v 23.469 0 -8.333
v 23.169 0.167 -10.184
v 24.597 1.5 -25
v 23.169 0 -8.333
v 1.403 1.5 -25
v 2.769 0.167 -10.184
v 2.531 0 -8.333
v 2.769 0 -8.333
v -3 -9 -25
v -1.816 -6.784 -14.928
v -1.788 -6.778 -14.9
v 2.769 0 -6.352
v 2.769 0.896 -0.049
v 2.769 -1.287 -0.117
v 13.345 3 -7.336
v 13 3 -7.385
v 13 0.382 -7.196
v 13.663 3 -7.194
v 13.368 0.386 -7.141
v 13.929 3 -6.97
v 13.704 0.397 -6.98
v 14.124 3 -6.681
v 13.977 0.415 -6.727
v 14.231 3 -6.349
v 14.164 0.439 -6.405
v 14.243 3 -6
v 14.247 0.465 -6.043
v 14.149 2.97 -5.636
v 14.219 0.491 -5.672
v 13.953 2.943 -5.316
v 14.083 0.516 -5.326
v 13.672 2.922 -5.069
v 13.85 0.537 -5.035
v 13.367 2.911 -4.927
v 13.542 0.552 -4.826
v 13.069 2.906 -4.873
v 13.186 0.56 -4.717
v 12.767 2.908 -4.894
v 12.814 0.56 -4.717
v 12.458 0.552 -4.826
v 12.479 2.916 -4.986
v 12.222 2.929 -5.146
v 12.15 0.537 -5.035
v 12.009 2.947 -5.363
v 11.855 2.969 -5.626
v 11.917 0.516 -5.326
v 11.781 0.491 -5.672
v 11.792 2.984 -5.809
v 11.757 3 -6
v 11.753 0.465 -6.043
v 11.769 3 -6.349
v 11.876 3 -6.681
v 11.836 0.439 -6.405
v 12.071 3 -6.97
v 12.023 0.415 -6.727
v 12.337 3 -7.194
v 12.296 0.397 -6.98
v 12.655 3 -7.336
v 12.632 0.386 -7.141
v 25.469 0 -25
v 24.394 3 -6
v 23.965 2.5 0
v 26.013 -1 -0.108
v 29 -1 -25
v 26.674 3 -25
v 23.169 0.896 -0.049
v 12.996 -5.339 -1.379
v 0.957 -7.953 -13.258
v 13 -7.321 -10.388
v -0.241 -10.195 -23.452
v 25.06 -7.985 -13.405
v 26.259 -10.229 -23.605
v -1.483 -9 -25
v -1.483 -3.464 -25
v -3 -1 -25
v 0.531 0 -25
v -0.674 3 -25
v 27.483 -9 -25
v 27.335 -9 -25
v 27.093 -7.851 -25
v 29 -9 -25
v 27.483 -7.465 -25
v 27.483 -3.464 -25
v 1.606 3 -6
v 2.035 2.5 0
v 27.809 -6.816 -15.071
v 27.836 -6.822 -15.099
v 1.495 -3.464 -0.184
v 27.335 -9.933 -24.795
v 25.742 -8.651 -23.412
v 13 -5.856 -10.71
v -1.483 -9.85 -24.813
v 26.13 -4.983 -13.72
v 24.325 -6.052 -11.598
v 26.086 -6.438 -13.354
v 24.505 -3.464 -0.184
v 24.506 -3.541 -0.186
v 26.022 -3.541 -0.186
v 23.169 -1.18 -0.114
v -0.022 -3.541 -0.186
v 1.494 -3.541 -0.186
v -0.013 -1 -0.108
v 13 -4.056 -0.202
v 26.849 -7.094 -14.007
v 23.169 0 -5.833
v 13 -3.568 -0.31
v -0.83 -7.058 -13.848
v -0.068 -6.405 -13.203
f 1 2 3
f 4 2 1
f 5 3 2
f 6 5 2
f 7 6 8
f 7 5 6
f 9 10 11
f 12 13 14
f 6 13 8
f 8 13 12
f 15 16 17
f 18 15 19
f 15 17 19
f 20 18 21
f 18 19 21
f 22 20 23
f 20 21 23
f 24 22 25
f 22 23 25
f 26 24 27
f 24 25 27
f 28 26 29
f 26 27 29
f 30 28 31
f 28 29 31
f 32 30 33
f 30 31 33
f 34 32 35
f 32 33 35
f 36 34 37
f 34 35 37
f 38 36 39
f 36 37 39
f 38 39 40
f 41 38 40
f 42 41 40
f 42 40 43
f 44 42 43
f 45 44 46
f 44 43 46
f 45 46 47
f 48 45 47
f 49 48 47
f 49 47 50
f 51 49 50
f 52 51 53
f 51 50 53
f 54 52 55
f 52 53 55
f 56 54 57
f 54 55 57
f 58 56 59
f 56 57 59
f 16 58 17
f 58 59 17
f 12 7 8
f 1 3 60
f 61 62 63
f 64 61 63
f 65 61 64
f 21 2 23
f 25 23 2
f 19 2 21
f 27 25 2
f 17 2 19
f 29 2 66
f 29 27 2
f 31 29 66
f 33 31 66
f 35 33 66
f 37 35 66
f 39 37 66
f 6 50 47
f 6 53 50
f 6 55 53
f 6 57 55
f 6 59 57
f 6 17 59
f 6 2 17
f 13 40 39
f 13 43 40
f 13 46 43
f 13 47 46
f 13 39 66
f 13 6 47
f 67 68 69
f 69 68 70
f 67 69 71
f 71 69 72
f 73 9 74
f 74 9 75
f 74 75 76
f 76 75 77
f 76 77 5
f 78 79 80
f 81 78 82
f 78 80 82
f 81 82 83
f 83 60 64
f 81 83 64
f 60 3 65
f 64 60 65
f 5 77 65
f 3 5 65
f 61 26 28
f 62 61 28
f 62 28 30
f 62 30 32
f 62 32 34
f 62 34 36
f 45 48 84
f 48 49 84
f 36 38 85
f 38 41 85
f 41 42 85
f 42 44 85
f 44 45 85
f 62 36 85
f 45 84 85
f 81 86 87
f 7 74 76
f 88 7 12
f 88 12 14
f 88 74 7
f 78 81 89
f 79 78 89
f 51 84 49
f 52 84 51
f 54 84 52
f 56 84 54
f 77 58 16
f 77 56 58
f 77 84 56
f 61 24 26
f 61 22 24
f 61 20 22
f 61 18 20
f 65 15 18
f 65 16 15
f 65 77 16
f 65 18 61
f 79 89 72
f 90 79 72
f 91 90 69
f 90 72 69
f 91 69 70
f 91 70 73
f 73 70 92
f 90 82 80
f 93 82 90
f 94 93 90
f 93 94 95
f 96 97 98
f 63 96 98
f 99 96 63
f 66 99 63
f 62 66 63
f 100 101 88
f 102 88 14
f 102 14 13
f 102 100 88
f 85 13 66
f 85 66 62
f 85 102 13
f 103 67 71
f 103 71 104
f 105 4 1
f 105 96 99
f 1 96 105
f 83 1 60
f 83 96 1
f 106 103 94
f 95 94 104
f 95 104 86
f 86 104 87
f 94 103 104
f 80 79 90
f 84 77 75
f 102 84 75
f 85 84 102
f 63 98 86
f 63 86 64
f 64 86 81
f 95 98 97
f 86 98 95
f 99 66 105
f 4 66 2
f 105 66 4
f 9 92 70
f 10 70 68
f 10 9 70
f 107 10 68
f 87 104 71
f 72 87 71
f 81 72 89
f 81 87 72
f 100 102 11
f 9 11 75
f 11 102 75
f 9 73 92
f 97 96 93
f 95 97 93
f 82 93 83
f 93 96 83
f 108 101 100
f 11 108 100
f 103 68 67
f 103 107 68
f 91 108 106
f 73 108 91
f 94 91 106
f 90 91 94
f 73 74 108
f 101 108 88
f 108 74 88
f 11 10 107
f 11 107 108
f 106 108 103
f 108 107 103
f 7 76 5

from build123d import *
from OCP.BRepFilletAPI import BRepFilletAPI_MakeChamfer

# Parameters (mm, degrees)
EXTRUDE_3_DEPTH                  = 3
EXTRUDE_4_DEPTH                  = 12.5
CHAMFER_3_SIZE                   = 2
CHAMFER_3_SIZE2                  = 3.464101615
CHAMFER_4_SIZE                   = 4
CHAMFER_4_SIZE2                  = 2.309401077
CUT_EXTRUDE_2_DEPTH              = 41.277164746
CUT_EXTRUDE_2_DEPTH_BACK         = 41.277164746
EXTRUDE_5_DEPTH                  = 1.5
CUT_EXTRUDE_5_DEPTH              = 1.5
CHAMFER_7_SIZE                   = 1.5
CHAMFER_7_SIZE_2                 = 1.539926414
CHAMFER_8_SIZE                   = 2.598076211
CHAMFER_8_SIZE_2                 = 1.5
CHAMFER_10_SIZE                  = 1
CUT_EXTRUDE_START                = 2.76887
CUT_EXTRUDE_13_DEPTH             = 20.4
SKETCH_16_R                      = 1.25
CUT_EXTRUDE_14_DEPTH             = 10
CUT_EXTRUDE_15_REACH             = 54.631
CUT_EXTRUDE_START_2              = 13
CUT_EXTRUDE_15_DIRECTION_2_REACH = 54.631
CUT_EXTRUDE_START_3              = -5
CUT_EXTRUDE_16_DEPTH             = 45.631175115


# Some blends are built 0.0001 mm under size
with BuildPart() as part:
    # Эскиз5 → Бобышка-Вытянуть3 (new body)
    with BuildSketch(Plane(origin=(0, 0, 0), x_dir=(1, 0, 0), z_dir=(0, 1, 0))):
        Polygon((0, 0), (26, 0), (29, 25), (13, 25), (-3, 25), align=None)
    extrude(amount=EXTRUDE_3_DEPTH)

    # Эскиз6 → Бобышка-Вытянуть4 (add)
    with BuildSketch(Plane(origin=(0, 0, 0), x_dir=(-1, 0, 0), z_dir=(0, -1, 0))):
        Polygon((0, 0), (3, 25), (1.483218869, 25), (-1.516781131, 0), align=None)
        Polygon((-27.483218869, 25), (-29, 25), (-26, 0), (-24.483218869, 0), align=None)
    extrude(amount=EXTRUDE_4_DEPTH)

    # Фаска3
    chamfer_3_edges = [part.edges().sort_by_distance(p)[0] for p in [
        (0.016781131, 0, -12.5),
        (25.983218869, 0, -12.5),
    ]]
    chamfer_3_side = [part.faces().sort_by_distance(p)[0] for p in [
        (13, 0, -12.981390637),
    ]]
    chamfer(chamfer_3_edges, length=CHAMFER_3_SIZE, length2=CHAMFER_3_SIZE2, reference=chamfer_3_side[0])

    # Фаска4: one chamfer whose edges measure the first distance from different faces: ONE call of the kernel's chamfer builder (chamfer() names one face for all edges)
    chamfer_4_edges_1 = [part.edges().sort_by_distance(p)[0] for p in [
        (27.5, 3, -12.5),
    ]]
    chamfer_4_side_1 = [part.faces().sort_by_distance(p)[0] for p in [
        (27.5, -4.75, -12.5),
    ]]
    chamfer_4_edges_2 = [part.edges().sort_by_distance(p)[0] for p in [
        (-1.5, 3, -12.5),
    ]]
    chamfer_4_side_2 = [part.faces().sort_by_distance(p)[0] for p in [
        (-1.5, -4.75, -12.5),
    ]]
    chamfer_4 = BRepFilletAPI_MakeChamfer(part.part.solid().wrapped)
    for e in chamfer_4_edges_1:
        chamfer_4.Add(CHAMFER_4_SIZE, CHAMFER_4_SIZE2, e.wrapped, chamfer_4_side_1[0].wrapped)  # the first distance lies on this face
    for e in chamfer_4_edges_2:
        chamfer_4.Add(CHAMFER_4_SIZE, CHAMFER_4_SIZE2, e.wrapped, chamfer_4_side_2[0].wrapped)  # the first distance lies on this face
    add(Compound.cast(chamfer_4.Shape()), mode=Mode.REPLACE)

    # Эскиз7 → Вырез-Вытянуть2 (cut, two sides: drawn at the far end of the back side and taken through both)
    with BuildSketch(Plane(origin=(0, 0, 0), x_dir=(0, 0, -1), z_dir=(1, 0, 0)).offset(-CUT_EXTRUDE_2_DEPTH_BACK)):
        Polygon((25, -14), (25, -9), (0, -3.5), (0, -11), (0, -14), align=None)
    extrude(amount=CUT_EXTRUDE_2_DEPTH + CUT_EXTRUDE_2_DEPTH_BACK, mode=Mode.SUBTRACT)

    # Эскиз8 → Бобышка-Вытянуть5 (add)
    with BuildSketch(Plane(origin=(0, -3.33842045, 0.734452499), x_dir=(-1, 0, 0), z_dir=(0, -0.97664446670509, 0.2148617826751198))):
        Polygon((-29, 26.349867712), (3, 26.349867712), (0, 0.214861783), (-26, 0.214861783), align=None)
    extrude(amount=EXTRUDE_5_DEPTH)

    # Эскиз12 → Вырез-Вытянуть5 (cut)
    with BuildSketch(Plane(origin=(0, -4.80338715, 1.056745173), x_dir=(-1, 0, 0), z_dir=(0, -0.9766444667050901, 0.21486178267511977))):
        Polygon((-27.335370868, 26.349867712), (-13, 11.718369714), (1.483218869, 26.349867712), align=None)
        Polygon((-26, 0.214861783), (-13, 0.214861783), (-13, 1.069133834), (-27.836275269, 16.211883463), (-27.726463854, 15.255242802), align=None)
        Polygon((-13, 1.069133834), (-13, 0.214861783), (0, 0.214861783), (1.726463854, 15.255242802), (1.81620359, 16.037025649), align=None)
    extrude(amount=-CUT_EXTRUDE_5_DEPTH, mode=Mode.SUBTRACT)

    # Фаска7
    # the kernel refuses this chamfer: 1.539926414, 1.5 mm, written as the material it adds along each edge
    with BuildSketch(Plane(origin=(25.624388162, -5.592143703, -9.509744106), x_dir=(0.053421240321816, 0.9765759265760705, -0.20843615500811763), z_dir=(0.11640066814175269, -0.21340122492654667, -0.9700055678479392))) as chamfer_7_piece_1_section:
        Polygon((CHAMFER_7_SIZE * 0.99960211638, -CHAMFER_7_SIZE * 0.0282065405255), (-CHAMFER_7_SIZE_2 * 0.0537868652542, -CHAMFER_7_SIZE_2 * 0.998552439015), (0, 0), align=None)
    chamfer_7_piece_1 = extrude(amount=19.932121115, mode=Mode.PRIVATE)
    chamfer_7_piece_1 = split(chamfer_7_piece_1, bisect_by=Plane(origin=(26.215798587, -7.11837448, -25), z_dir=(0, 0, 1)), keep=Keep.TOP, mode=Mode.PRIVATE)
    chamfer_7_piece_1 = split(chamfer_7_piece_1, bisect_by=Plane(origin=(28.863675649, -6.560961429, -16.229864216), z_dir=(-0.7142981809435934, -0.1503691897591953, -0.6834963170872516)), keep=Keep.TOP, mode=Mode.PRIVATE)
    chamfer_7_piece_1 = split(chamfer_7_piece_1, bisect_by=Plane(origin=(23.540170532, -7.681629481, -21.323809907), z_dir=(0.7142981809435934, 0.15036918975919533, 0.6834963170872517)), keep=Keep.TOP, mode=Mode.PRIVATE)
    add(chamfer_7_piece_1)

    # Фаска8
    chamfer_8_edges_1 = [part.edges().sort_by_distance(p)[0] for p in [
        (-2.408101795, -9.357048885, -19.641717258),
    ]]
    chamfer_8_side_1 = [part.faces().sort_by_distance(p)[0] for p in [
        (-2.378297509, -9.357783968, -19.645058546),
    ]]
    chamfer_8_edges_2 = [part.edges().sort_by_distance(p)[0] for p in [
        (28.418137634, -9.375834016, -19.727104216),
    ]]
    chamfer_8_side_2 = [part.faces().sort_by_distance(p)[0] for p in [
        (28.388333349, -9.376569099, -19.730445503),
    ]]
    chamfer_8 = BRepFilletAPI_MakeChamfer(part.part.solid().wrapped)
    for e in chamfer_8_edges_1:
        chamfer_8.Add(CHAMFER_8_SIZE - 0.0001, CHAMFER_8_SIZE_2 - 0.0001, e.wrapped, chamfer_8_side_1[0].wrapped)
    for e in chamfer_8_edges_2:
        chamfer_8.Add(CHAMFER_8_SIZE - 0.0001, CHAMFER_8_SIZE_2 - 0.0001, e.wrapped, chamfer_8_side_2[0].wrapped)
    add(Compound.cast(chamfer_8.Shape()), mode=Mode.REPLACE)  # a hair under: the kernel refuses the full size

    # Фаска10
    chamfer_10_edges = [part.edges().sort_by_distance(p)[0] for p in [
        (7.070930475, -6.320076094, -5.837295478),
        (18.937101702, -6.335110761, -5.905634875),
    ]]
    chamfer(chamfer_10_edges, length=CHAMFER_10_SIZE)

    # Эскиз15 → Вырез-Вытянуть13 (cut)
    with BuildSketch(Plane(origin=(0, 0, 0), x_dir=(0, 0, -1), z_dir=(1, 0, 0)).offset(CUT_EXTRUDE_START)):
        Polygon((-0.003394727, -2.1), (12.496605273, -2.1), (12.496605273, 0), (-0.003394727, 0.9), align=None)
    extrude(amount=CUT_EXTRUDE_13_DEPTH, mode=Mode.SUBTRACT)

    # Эскиз16 → Вырез-Вытянуть14 (cut)
    with BuildSketch(Plane(origin=(0, 0.891145714, -0.119581473), x_dir=(-1, 0, 0), z_dir=(0, -0.9974180343569141, 0.0718140984736978))):
        with Locations(Location((-13, 5.84494773, 0), (0, 0, 90))):
            Circle(SKETCH_16_R)
    extrude(amount=-CUT_EXTRUDE_14_DEPTH, mode=Mode.SUBTRACT)

    # Вырез-Вытянуть15: up to this plane
    cut_extrude_15_end = Plane(origin=(1.516781131, -3.464101615, 0), z_dir=(0.8598565649588564, -0.4999999999999951, -0.10318278779506272))
    # Эскиз17 → Вырез-Вытянуть15 (cut, up to the surface)
    with BuildSketch(Plane(origin=(0, 0, 0), x_dir=(0, 0, -1), z_dir=(1, 0, 0)).offset(CUT_EXTRUDE_START_2), mode=Mode.PRIVATE) as cut_extrude_15_sk1:
        Polygon((25, 1.5), (8.333333333, 0), (8.333333333, -2.621768853), (25, -2.621768853), align=None)
    cut_extrude_15_tool1 = split(extrude(cut_extrude_15_sk1.sketch, amount=-CUT_EXTRUDE_15_REACH, mode=Mode.PRIVATE), bisect_by=cut_extrude_15_end, keep=Keep.BOTH, mode=Mode.PRIVATE)
    add(cut_extrude_15_tool1.solids().sort_by_distance((13, -0.90808, -17.284542))[0], mode=Mode.SUBTRACT)

    # Вырез-Вытянуть15 direction 2: up to this plane
    cut_extrude_15_direction_2_end = Plane(origin=(24.483218869, -3.464101615, 0), z_dir=(-0.859856564958857, -0.49999999999999406, -0.10318278779506279))
    # Эскиз17 → Вырез-Вытянуть15 direction 2 (cut, up to the surface)
    with BuildSketch(Plane(origin=(0, 0, 0), x_dir=(0, 0, -1), z_dir=(1, 0, 0)).offset(CUT_EXTRUDE_START_2), mode=Mode.PRIVATE) as cut_extrude_15_direction_2_sk1:
        Polygon((25, 1.5), (8.333333333, 0), (8.333333333, -2.621768853), (25, -2.621768853), align=None)
    cut_extrude_15_direction_2_tool1 = split(extrude(cut_extrude_15_direction_2_sk1.sketch, amount=CUT_EXTRUDE_15_DIRECTION_2_REACH, mode=Mode.PRIVATE), bisect_by=cut_extrude_15_direction_2_end, keep=Keep.BOTH, mode=Mode.PRIVATE)
    add(cut_extrude_15_direction_2_tool1.solids().sort_by_distance((13, -0.90808, -17.284542))[0], mode=Mode.SUBTRACT)

    # Эскиз18 → Вырез-Вытянуть16 (cut, through all)
    with BuildSketch(Plane(origin=(0, 0, 0), x_dir=(0, 0, -1), z_dir=(1, 0, 0)).offset(CUT_EXTRUDE_START_3)):
        Polygon((6, 3), (0, 2.5), (0, 3), align=None)
        Polygon((0.202280253, -4.056458685), (0, 2.5), (0, -4.056458685), align=None)
    extrude(amount=CUT_EXTRUDE_16_DEPTH, mode=Mode.SUBTRACT)


solid = part.part
